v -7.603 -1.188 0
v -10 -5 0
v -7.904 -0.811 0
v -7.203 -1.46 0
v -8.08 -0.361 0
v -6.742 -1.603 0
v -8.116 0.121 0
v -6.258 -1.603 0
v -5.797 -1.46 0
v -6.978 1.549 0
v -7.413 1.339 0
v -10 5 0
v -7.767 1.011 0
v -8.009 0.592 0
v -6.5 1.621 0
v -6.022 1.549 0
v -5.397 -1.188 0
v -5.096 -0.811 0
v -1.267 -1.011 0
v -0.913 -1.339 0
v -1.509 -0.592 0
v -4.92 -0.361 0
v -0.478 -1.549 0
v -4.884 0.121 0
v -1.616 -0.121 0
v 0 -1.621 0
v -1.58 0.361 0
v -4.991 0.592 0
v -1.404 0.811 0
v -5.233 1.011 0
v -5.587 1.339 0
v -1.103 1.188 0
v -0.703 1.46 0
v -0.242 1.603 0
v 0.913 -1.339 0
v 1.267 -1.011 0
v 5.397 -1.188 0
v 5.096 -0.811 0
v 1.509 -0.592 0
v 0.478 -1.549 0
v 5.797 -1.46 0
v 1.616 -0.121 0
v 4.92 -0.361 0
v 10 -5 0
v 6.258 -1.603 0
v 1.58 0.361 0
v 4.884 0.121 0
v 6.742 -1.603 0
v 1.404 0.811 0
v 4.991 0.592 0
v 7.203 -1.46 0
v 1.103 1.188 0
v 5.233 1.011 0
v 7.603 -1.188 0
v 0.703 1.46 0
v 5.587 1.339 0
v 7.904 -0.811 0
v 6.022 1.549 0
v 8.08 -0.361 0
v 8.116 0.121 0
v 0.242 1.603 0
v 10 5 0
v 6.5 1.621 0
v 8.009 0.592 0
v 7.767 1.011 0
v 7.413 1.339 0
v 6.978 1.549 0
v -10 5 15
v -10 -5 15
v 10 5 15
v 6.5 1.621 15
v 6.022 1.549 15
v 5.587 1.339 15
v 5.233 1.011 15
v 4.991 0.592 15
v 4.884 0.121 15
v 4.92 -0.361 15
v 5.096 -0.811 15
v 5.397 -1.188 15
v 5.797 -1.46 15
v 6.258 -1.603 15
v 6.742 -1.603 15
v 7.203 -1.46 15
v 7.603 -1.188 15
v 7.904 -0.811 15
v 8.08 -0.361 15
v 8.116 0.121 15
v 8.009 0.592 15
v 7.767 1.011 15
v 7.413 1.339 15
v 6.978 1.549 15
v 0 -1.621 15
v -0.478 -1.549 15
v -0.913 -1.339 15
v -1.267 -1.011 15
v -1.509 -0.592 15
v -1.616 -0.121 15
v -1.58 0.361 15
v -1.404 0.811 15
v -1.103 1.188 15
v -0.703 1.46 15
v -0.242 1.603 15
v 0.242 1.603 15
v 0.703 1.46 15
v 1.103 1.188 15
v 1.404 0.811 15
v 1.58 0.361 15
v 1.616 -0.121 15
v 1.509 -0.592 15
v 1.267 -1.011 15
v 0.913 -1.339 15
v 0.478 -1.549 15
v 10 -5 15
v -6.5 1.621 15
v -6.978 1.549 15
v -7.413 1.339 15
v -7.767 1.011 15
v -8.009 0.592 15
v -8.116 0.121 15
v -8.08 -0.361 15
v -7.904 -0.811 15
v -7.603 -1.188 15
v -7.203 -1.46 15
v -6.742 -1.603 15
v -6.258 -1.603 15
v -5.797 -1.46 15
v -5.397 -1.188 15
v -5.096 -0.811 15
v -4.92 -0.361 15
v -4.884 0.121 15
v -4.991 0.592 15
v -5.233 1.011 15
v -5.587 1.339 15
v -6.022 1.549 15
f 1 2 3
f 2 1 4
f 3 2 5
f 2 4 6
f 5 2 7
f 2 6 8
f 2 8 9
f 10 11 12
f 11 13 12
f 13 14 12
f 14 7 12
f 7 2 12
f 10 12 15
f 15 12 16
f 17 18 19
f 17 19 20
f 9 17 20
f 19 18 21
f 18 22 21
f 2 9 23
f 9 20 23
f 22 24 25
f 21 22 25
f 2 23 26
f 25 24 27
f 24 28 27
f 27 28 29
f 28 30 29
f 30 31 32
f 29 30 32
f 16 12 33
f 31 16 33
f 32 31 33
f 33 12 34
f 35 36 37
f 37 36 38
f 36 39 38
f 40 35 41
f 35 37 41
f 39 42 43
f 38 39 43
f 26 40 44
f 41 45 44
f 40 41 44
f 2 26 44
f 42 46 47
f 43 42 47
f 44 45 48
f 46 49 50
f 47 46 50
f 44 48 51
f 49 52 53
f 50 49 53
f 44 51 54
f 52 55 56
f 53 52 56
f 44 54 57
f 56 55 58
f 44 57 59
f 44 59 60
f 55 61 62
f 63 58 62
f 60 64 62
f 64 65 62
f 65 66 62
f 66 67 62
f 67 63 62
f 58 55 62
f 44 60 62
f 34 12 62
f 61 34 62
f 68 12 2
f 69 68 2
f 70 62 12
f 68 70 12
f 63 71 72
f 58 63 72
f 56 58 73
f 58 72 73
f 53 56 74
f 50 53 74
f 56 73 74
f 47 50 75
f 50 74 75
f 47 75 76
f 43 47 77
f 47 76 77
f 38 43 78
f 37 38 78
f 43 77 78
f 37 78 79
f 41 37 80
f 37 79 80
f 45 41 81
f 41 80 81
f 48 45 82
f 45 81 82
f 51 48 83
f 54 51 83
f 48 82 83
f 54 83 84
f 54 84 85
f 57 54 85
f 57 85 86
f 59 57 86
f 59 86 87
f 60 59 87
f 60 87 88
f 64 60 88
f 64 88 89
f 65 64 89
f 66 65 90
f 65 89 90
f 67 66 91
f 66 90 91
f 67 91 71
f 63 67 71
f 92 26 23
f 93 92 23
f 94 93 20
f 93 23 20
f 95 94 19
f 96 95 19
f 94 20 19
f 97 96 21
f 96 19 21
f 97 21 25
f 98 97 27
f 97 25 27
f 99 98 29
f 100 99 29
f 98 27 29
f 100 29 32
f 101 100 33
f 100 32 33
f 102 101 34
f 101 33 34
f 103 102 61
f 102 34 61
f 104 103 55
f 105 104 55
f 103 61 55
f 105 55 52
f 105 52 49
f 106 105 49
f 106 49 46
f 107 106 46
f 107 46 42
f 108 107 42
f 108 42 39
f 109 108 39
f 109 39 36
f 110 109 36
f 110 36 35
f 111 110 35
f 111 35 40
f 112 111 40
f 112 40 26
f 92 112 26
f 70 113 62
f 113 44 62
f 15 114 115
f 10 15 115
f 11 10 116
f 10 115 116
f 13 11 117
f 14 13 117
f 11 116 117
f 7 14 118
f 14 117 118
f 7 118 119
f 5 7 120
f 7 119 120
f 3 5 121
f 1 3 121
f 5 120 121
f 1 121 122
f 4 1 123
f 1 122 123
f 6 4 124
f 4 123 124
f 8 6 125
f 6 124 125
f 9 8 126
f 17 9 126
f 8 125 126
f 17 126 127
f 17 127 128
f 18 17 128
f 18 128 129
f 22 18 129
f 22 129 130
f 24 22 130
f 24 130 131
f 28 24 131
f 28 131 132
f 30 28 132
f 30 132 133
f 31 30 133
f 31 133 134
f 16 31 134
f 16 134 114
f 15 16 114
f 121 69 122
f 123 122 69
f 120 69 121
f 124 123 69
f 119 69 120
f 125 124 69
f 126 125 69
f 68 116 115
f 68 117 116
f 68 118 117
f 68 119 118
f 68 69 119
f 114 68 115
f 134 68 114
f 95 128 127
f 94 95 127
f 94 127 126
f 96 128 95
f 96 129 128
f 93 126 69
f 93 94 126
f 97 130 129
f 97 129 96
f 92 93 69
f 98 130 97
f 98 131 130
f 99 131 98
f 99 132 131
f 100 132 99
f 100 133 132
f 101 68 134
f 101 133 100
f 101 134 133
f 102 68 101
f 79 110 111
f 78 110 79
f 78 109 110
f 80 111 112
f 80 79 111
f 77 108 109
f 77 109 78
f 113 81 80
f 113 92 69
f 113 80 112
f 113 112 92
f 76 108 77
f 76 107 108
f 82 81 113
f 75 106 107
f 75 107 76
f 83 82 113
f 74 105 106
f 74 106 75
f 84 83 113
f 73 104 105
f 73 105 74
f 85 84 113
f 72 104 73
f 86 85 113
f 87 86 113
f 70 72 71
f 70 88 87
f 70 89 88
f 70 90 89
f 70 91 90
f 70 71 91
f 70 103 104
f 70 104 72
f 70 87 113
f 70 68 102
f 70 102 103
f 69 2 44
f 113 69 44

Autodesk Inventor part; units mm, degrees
ref_plane "YZ Plane" through (0, 0, 0) normal (1, 0, 0) x (0, 1, 0)
ref_plane "XZ Plane" through (0, 0, 0) normal (0, 1, 0) x (-1, 0, 0)
ref_plane "XY Plane" through (0, 0, 0) normal (0, 0, 1) x (1, 0, 0)
sketch "Skizze1" plane through (0, 0, 0) normal (0, 0, 1) x (1, 0, 0)
  line L0 (-10, -5) -> (10, -5)
  line L1 (10, -5) -> (10, 5)
  line L2 (10, 5) -> (-10, 5)
  line L3 (-10, 5) -> (-10, -5)
  line L4 (-10, -5) -> (10, 5) construction
  line L5 (10, -5) -> (-10, 5) construction
  circle A0 centre (0, 0) radius 2
  circle A1 centre (-6.5, 0) radius 2
  circle A2 centre (6.5, 0) radius 2
  line L6 (-10, 0) -> (10, 0) construction
  dimension "d0" = 10
  dimension "d1" = 20
  dimension "d2" = 4
  dimension "d3" = 6.5
  dimension "d4" = 6.5
extrude "Extrusion1" add sketch "Skizze1" along normal blind 15 contours L3 L2 L1 L0 | A0 | A1 | A2
sketch "Skizze2" plane through (0, 0, 15) normal (0, 0, 1) x (1, 0, 0)
  point P0 (0, 0)
hole "Bohrung1" at (0, 0, 15) direction (0, 0, -1) diameter 3.242 end through all thread size "M4x0.7" class "6H" standard "ANSI Metric M Profile"
sketch "Skizze3" plane through (0, 0, 0) normal (0, 0, -1) x (-1, 0, 0)
  point P0 (0, 0)
  point P1 (-6.5, 0)
  point P2 (6.5, 0)
hole "Bohrung2" at (6.5, 0, 0) at (-6.5, 0, 0) direction (0, 0, 1) diameter 3.242 end through all thread size "M4x0.7" class "6H" standard "ANSI Metric M Profile"
equation "\"d4\" = d3"
properties part number "Alu_Belt_tens" material "Aluminium 6061"
